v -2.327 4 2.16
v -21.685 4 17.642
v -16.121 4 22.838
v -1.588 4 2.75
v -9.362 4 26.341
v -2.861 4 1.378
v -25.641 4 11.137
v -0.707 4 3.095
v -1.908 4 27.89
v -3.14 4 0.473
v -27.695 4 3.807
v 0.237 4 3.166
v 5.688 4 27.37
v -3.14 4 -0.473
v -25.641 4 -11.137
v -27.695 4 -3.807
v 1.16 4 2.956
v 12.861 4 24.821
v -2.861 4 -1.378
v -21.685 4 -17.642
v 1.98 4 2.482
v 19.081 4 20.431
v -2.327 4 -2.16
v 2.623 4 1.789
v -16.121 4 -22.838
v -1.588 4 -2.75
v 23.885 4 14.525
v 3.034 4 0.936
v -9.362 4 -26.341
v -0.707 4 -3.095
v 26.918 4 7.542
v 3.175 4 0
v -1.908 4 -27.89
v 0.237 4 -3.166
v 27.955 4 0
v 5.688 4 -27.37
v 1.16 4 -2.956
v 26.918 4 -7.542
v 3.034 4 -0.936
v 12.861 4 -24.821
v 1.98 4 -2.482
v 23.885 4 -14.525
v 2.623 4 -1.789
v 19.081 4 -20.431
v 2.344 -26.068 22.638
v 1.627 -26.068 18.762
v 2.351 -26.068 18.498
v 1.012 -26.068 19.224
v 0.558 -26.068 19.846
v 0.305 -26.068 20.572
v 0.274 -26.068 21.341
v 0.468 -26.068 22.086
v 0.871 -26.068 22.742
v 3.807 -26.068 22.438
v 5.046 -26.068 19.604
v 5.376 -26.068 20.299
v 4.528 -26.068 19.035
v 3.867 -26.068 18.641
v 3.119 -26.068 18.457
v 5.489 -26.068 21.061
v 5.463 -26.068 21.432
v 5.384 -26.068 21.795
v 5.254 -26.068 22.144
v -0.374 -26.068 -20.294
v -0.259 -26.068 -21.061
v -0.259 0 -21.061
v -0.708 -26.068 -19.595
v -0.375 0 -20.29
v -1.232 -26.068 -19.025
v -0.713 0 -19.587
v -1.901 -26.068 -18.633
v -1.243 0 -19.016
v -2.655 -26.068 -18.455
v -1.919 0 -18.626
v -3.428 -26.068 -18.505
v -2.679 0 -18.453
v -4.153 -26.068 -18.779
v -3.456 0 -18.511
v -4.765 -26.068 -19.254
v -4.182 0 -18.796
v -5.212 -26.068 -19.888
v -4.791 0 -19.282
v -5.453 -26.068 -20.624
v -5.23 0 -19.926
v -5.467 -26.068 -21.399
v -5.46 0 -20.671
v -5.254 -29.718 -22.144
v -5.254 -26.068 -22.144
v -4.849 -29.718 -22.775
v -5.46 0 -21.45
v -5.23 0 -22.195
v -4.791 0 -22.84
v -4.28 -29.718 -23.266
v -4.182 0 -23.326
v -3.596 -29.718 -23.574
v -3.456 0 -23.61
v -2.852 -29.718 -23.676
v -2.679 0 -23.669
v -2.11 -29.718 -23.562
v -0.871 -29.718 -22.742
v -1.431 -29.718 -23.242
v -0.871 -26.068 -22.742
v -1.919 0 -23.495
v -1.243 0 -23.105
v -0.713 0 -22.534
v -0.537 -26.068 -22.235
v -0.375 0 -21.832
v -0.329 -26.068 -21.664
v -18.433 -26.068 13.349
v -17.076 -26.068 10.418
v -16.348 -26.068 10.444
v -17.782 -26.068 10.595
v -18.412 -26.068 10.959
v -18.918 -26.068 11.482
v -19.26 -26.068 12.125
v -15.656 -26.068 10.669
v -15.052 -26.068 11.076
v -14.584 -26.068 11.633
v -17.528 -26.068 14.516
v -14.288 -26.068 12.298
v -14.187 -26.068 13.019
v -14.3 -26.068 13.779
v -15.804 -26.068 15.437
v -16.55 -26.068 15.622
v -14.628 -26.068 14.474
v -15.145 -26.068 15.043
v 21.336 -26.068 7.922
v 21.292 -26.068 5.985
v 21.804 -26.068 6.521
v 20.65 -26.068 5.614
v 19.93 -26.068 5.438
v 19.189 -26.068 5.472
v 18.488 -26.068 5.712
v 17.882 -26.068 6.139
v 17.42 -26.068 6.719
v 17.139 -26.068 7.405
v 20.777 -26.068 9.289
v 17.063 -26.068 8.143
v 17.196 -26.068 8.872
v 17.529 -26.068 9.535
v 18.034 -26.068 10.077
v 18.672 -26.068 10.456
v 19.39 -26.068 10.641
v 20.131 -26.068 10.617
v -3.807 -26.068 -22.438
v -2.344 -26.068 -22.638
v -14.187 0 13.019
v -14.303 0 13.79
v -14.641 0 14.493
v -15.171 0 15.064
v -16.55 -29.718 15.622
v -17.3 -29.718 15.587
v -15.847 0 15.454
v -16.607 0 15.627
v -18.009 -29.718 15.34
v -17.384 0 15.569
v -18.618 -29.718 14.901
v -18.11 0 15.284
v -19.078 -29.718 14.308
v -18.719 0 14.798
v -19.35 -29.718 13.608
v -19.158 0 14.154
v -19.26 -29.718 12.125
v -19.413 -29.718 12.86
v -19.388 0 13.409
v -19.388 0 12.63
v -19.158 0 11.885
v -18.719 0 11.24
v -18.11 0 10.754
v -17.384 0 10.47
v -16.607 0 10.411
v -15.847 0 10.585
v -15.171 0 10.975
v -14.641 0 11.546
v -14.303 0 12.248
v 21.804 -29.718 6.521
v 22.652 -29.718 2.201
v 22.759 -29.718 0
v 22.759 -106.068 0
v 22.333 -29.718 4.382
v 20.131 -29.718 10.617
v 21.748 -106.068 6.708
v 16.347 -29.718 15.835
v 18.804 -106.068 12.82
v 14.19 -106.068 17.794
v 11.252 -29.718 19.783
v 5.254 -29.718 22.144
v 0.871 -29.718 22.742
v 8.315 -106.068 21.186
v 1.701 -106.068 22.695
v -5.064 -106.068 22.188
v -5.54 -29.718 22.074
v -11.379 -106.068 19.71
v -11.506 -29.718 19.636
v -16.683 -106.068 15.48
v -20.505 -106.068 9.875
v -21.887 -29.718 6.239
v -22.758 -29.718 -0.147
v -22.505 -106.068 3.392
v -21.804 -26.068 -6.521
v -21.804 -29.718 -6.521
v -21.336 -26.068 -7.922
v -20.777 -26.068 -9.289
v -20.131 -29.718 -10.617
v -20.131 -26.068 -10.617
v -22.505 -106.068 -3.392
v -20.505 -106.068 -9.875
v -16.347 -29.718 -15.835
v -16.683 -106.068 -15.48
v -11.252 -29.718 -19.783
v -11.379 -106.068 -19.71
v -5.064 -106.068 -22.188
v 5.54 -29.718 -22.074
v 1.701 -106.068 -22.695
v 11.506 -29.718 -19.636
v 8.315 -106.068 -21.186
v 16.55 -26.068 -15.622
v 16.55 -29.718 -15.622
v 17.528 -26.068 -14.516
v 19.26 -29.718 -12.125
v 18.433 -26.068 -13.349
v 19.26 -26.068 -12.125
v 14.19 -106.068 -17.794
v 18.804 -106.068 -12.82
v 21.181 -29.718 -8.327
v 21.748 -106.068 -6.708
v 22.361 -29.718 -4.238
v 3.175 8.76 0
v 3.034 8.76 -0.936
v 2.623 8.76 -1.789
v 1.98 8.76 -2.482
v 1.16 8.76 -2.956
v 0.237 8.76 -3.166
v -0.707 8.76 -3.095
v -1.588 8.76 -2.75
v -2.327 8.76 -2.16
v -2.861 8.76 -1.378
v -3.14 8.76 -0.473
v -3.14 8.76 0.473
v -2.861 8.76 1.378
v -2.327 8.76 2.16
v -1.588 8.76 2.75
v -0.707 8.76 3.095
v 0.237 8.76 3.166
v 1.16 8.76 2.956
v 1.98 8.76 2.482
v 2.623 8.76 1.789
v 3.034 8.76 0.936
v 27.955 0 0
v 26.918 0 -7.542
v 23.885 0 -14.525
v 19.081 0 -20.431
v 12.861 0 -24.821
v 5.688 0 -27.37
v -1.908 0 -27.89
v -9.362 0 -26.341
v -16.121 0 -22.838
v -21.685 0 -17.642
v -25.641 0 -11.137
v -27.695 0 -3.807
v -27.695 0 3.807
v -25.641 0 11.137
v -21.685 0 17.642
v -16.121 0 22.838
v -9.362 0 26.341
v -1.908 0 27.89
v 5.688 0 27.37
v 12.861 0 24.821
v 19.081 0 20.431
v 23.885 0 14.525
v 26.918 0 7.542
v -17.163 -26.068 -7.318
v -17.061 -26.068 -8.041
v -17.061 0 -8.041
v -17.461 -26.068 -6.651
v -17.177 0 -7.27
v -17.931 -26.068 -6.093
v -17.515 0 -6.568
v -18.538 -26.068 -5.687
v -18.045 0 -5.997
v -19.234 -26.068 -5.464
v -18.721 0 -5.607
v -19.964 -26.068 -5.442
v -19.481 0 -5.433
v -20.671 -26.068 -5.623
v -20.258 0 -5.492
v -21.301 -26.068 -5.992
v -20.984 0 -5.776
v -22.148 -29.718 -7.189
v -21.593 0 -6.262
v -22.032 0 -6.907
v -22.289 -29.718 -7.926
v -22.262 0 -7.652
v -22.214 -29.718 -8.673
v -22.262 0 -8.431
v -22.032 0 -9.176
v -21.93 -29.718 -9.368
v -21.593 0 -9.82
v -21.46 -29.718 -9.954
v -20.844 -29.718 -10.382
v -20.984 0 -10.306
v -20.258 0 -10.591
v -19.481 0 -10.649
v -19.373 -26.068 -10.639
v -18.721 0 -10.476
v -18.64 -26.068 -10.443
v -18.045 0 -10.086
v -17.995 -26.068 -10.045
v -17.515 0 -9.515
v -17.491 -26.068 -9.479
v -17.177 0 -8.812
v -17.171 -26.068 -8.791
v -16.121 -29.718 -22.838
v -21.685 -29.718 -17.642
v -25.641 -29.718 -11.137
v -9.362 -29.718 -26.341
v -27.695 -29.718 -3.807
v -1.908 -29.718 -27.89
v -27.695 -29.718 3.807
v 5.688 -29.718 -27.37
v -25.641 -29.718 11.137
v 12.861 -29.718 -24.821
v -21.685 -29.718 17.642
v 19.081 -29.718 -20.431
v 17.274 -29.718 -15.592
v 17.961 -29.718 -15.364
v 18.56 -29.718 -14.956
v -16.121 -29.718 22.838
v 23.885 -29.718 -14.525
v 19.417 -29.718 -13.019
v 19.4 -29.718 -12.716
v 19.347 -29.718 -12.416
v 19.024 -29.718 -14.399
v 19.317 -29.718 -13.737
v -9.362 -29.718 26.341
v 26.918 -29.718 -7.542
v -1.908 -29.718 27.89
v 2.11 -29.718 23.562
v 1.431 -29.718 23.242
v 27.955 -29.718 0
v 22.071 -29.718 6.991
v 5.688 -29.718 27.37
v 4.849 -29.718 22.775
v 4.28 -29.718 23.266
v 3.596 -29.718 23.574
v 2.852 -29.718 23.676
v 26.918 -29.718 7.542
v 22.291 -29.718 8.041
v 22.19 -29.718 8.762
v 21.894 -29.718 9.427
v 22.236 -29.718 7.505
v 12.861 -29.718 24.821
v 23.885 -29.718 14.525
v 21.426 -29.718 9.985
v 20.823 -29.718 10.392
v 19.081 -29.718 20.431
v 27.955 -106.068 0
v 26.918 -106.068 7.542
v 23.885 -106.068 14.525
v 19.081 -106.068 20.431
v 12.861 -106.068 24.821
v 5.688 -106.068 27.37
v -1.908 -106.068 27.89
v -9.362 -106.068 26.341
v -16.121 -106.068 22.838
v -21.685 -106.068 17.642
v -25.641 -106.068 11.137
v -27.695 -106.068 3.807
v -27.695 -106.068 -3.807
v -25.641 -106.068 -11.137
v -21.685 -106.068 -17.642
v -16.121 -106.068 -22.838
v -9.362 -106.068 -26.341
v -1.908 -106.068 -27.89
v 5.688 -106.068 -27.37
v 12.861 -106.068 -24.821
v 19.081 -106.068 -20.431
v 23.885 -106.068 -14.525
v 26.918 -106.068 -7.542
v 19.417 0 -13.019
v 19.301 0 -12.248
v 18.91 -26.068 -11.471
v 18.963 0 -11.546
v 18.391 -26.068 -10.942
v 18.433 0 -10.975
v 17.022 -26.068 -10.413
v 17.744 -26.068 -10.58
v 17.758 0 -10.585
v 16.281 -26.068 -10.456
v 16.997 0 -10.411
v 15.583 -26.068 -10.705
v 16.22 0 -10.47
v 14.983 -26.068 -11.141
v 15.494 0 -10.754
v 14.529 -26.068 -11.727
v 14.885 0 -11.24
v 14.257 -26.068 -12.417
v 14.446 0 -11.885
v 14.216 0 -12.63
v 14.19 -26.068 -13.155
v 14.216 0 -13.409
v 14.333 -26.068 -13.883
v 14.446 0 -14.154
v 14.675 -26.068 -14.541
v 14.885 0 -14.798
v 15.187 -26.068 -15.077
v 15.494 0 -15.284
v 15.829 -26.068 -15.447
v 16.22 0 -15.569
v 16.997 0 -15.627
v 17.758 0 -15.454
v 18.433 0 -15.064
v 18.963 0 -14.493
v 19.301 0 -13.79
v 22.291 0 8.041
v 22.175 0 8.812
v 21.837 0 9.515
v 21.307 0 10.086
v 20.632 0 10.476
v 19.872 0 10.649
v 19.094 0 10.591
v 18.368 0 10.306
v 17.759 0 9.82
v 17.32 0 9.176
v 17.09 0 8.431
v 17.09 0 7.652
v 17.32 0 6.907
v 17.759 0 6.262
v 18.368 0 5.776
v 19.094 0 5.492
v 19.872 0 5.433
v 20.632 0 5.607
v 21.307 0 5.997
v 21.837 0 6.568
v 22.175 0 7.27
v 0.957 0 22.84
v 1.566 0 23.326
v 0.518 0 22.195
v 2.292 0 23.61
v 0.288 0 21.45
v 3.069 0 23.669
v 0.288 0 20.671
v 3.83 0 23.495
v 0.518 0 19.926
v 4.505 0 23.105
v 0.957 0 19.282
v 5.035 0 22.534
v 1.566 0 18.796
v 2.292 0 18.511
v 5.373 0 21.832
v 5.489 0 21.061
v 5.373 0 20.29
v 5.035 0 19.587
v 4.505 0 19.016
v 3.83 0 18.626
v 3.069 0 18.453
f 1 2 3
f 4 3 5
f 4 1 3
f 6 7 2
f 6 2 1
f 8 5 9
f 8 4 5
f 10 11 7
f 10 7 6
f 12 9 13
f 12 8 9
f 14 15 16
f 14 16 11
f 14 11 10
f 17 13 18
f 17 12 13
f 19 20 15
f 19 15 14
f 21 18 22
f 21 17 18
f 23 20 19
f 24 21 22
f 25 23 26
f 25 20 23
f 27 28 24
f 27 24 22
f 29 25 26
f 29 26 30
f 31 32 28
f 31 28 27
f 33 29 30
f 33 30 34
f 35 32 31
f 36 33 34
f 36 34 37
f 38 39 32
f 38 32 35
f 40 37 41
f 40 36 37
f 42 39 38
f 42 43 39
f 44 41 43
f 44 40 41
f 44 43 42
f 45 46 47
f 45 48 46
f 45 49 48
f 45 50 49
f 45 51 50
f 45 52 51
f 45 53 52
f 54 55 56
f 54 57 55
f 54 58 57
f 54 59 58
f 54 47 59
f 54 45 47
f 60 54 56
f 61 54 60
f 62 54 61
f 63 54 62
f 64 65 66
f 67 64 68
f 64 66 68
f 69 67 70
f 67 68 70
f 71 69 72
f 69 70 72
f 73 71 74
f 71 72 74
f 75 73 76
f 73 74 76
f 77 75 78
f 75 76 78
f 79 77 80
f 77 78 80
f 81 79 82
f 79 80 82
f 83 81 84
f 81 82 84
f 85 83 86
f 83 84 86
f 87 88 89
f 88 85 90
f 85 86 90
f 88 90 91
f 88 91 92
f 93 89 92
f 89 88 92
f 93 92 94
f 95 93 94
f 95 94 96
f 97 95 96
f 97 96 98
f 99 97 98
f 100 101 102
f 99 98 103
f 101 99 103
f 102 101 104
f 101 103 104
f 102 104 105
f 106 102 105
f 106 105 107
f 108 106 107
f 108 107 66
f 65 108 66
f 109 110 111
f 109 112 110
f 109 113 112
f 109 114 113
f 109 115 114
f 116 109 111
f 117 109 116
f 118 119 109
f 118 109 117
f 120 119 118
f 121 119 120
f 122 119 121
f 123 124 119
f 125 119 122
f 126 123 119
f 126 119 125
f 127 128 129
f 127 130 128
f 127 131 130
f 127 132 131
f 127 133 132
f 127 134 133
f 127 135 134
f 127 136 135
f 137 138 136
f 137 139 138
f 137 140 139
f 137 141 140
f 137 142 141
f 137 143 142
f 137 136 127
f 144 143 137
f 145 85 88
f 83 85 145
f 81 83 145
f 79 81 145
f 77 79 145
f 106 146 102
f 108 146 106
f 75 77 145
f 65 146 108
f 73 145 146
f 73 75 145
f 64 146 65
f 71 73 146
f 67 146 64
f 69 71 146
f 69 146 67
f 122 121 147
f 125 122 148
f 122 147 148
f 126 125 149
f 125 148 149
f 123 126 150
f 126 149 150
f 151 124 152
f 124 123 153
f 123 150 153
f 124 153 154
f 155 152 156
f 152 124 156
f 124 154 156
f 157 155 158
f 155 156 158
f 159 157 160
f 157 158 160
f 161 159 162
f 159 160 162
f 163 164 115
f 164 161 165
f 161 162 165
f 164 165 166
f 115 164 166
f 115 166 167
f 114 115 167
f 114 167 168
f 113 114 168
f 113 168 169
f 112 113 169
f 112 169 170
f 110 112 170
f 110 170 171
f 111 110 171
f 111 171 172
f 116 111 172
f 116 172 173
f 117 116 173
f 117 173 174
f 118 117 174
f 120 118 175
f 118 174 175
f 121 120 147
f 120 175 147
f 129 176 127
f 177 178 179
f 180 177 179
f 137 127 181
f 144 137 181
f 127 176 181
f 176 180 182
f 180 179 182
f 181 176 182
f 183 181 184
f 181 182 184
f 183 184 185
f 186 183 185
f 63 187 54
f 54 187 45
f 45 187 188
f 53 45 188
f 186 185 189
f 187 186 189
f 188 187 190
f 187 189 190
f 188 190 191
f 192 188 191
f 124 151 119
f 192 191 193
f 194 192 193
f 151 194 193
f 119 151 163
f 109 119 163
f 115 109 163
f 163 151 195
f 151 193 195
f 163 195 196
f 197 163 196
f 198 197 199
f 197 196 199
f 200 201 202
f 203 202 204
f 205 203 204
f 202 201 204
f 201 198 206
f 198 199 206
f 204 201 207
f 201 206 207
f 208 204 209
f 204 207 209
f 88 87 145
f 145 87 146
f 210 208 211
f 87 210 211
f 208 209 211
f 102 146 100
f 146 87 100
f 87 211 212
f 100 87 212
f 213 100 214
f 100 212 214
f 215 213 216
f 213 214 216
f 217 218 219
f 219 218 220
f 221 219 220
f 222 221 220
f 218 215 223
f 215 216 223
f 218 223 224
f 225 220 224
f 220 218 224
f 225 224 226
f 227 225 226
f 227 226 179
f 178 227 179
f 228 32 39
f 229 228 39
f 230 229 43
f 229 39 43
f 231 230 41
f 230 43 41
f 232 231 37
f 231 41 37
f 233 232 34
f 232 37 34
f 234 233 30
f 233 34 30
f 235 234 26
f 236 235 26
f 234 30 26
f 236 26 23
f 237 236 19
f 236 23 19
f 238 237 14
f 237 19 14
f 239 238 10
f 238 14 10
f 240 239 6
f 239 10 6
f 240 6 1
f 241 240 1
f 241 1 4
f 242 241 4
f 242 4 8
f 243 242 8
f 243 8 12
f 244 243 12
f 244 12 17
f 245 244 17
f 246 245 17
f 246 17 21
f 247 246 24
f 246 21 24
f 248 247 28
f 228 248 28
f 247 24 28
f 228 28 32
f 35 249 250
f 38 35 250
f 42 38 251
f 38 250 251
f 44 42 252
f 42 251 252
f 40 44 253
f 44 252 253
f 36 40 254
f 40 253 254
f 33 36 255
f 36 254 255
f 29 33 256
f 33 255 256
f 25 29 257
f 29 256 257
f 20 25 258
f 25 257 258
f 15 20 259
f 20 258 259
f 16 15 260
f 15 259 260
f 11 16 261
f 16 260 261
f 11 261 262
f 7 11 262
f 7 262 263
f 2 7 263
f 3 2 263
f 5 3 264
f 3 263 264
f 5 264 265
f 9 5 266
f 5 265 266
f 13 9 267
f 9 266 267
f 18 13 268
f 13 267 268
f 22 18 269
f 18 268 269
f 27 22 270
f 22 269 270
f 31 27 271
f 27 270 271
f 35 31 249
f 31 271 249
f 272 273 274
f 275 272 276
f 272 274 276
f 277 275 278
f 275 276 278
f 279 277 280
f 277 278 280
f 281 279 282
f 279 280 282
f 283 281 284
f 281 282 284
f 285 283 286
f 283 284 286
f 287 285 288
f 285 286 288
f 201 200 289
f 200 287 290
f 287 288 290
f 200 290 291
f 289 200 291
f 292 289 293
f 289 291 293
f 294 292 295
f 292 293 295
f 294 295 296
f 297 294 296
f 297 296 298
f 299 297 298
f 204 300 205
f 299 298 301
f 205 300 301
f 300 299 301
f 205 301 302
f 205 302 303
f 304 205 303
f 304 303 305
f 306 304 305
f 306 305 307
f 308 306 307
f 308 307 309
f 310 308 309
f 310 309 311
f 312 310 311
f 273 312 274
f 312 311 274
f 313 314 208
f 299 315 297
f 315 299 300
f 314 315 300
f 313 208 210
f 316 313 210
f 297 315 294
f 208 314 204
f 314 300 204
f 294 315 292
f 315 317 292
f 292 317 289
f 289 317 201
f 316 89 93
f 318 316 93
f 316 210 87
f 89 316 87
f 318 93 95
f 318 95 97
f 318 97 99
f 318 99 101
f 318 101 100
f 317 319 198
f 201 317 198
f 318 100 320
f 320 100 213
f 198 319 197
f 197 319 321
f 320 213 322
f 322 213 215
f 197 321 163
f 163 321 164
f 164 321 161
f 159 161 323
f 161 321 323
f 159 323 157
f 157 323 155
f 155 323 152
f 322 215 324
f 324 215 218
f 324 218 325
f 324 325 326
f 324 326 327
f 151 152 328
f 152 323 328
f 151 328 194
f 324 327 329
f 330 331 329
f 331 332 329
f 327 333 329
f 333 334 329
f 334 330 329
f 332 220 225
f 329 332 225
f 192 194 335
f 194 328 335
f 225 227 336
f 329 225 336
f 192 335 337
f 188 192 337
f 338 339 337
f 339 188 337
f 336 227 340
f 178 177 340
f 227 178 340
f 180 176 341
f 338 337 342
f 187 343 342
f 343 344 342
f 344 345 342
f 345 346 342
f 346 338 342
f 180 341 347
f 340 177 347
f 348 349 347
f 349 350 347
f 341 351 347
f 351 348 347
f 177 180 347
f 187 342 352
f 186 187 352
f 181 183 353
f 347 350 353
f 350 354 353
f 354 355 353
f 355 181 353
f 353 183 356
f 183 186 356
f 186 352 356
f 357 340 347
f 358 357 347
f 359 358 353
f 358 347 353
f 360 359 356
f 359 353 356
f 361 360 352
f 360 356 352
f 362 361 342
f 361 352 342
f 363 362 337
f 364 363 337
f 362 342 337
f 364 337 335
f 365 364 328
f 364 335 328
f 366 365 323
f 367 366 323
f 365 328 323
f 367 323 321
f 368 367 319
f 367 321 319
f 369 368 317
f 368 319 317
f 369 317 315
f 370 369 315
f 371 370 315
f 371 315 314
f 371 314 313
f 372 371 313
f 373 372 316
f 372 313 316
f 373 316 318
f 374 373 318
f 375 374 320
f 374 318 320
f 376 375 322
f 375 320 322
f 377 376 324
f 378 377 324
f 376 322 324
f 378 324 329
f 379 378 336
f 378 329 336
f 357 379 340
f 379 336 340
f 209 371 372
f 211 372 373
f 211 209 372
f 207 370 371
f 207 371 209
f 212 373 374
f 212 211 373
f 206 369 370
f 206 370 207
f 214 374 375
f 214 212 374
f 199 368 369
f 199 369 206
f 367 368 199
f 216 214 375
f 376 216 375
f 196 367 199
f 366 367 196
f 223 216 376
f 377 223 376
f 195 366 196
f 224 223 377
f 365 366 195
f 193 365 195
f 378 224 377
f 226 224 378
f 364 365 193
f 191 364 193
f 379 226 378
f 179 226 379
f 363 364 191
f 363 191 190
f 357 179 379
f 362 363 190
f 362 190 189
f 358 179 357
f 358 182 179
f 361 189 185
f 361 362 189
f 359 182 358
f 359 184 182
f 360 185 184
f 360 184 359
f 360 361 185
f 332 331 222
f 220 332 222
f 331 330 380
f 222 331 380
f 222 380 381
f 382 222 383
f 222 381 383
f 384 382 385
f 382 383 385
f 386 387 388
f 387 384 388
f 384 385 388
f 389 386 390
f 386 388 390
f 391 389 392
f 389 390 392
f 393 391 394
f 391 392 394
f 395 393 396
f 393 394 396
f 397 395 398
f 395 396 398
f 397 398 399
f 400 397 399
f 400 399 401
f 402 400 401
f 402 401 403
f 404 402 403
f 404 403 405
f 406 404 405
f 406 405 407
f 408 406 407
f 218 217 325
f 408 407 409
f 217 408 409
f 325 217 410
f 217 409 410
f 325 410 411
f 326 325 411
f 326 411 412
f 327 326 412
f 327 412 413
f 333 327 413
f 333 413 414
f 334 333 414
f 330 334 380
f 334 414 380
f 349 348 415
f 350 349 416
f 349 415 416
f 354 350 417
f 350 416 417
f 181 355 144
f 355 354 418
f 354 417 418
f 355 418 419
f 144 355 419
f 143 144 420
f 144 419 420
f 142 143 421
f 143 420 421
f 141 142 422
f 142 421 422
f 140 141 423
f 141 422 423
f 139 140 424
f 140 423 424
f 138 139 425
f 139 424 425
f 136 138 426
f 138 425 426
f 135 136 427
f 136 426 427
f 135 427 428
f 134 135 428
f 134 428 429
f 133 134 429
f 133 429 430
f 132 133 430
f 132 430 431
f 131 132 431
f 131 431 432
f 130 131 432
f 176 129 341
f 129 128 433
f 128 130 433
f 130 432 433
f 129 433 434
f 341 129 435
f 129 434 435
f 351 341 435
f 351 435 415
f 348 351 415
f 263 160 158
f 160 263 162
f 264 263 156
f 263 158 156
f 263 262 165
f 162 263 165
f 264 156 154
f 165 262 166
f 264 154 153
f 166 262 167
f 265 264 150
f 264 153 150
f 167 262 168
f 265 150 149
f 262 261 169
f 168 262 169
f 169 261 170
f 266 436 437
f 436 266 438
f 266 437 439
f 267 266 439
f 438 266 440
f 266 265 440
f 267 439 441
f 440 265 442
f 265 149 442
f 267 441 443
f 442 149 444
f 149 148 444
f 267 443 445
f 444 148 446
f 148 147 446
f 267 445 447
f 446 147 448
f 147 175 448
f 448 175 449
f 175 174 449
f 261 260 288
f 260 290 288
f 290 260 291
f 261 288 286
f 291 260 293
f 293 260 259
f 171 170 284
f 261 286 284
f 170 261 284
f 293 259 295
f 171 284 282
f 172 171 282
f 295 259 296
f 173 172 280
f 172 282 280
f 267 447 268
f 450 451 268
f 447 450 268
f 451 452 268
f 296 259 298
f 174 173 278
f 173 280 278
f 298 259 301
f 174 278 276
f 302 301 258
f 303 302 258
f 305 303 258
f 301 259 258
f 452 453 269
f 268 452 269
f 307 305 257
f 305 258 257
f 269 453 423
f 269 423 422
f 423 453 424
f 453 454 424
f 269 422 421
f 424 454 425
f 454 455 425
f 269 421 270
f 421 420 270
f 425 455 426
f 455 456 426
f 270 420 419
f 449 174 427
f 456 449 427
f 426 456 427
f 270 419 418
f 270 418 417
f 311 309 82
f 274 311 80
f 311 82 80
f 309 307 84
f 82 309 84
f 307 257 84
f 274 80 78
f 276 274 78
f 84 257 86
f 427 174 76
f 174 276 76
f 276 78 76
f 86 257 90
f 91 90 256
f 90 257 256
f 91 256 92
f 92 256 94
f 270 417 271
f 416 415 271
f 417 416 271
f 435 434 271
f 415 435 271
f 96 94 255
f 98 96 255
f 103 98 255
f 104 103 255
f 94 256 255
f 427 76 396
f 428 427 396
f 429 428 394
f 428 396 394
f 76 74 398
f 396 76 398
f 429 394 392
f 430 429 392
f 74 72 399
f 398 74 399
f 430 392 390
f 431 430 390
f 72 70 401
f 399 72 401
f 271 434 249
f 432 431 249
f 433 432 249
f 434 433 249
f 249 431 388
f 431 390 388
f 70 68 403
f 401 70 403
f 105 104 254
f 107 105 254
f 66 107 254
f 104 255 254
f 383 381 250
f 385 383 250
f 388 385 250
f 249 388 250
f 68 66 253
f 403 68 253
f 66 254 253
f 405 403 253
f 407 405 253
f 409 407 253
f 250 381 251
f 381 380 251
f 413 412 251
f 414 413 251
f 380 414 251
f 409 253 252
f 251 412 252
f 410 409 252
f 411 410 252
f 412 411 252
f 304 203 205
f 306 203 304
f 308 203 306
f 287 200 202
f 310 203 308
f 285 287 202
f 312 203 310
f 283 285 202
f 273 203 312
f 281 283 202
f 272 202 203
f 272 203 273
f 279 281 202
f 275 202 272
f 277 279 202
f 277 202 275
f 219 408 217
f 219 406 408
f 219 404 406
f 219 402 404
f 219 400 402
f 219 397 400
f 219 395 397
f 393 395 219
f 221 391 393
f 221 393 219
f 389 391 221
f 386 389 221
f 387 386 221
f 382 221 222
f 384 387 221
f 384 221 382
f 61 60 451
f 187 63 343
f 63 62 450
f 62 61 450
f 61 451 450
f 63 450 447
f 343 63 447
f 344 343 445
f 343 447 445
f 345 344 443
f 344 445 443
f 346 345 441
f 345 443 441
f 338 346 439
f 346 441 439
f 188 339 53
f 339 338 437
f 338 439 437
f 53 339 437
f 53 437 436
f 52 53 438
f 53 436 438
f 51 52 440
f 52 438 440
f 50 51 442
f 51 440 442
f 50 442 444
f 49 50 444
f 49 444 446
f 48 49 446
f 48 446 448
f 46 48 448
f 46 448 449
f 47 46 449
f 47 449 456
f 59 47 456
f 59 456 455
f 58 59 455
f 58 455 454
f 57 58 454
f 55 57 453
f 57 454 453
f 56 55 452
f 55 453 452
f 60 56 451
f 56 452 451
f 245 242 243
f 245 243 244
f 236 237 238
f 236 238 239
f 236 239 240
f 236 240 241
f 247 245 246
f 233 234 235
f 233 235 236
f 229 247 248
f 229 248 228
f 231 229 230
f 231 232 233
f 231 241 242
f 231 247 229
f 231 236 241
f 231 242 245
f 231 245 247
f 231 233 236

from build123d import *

# Parameters (mm, degrees)
SKETCH1_R           = 27.955
BOSS_EXTRUDE1_DEPTH = 4
SKETCH2_R           = 3.175
BOSS_EXTRUDE2_DEPTH = 4.76
SKETCH3_R           = 2.615316251
BOSS_EXTRUDE3_DEPTH = 29.718
SKETCH4_R           = 27.955
BOSS_EXTRUDE4_DEPTH = 76.35
SKETCH5_R           = 22.758745994
CUT_EXTRUDE1_DEPTH  = 80


with BuildPart() as part:
    # Sketch1 → Boss-Extrude1 (new body)
    with BuildSketch(Plane(origin=(0, 0, 0), x_dir=(1, 0, 0), z_dir=(0, 1, 0))):
        Circle(SKETCH1_R)
    extrude(amount=BOSS_EXTRUDE1_DEPTH)

    # Sketch2 → Boss-Extrude2 (add)
    with BuildSketch(Plane(origin=(0, 4, 0), x_dir=(1, 0, 0), z_dir=(0, 1, 0))):
        Circle(SKETCH2_R)
    extrude(amount=BOSS_EXTRUDE2_DEPTH)

    # Sketch3 → Boss-Extrude3 (add)
    with BuildSketch(Plane.XZ):
        with Locations((2.874048201, 21.060648295)):
            Circle(SKETCH3_R)
        with Locations((19.676080545, 8.041325394)):
            Circle(SKETCH3_R)
        with Locations((16.802032343, -13.019322902)):
            Circle(SKETCH3_R)
        with Locations((-2.874048201, -21.060648295)):
            Circle(SKETCH3_R)
        with Locations((-19.676080545, -8.041325394)):
            Circle(SKETCH3_R)
        with Locations((-16.802032343, 13.019322902)):
            Circle(SKETCH3_R)
    extrude(amount=BOSS_EXTRUDE3_DEPTH)

    # Sketch4 → Boss-Extrude4 (add)
    with BuildSketch(Plane.XZ.offset(29.718)):
        Circle(SKETCH4_R)
    extrude(amount=BOSS_EXTRUDE4_DEPTH)

    # Sketch5 → Cut-Extrude1 (cut)
    with BuildSketch(Plane.XZ.offset(106.068)):
        Circle(SKETCH5_R)
    extrude(amount=-CUT_EXTRUDE1_DEPTH, mode=Mode.SUBTRACT)


solid = part.part
